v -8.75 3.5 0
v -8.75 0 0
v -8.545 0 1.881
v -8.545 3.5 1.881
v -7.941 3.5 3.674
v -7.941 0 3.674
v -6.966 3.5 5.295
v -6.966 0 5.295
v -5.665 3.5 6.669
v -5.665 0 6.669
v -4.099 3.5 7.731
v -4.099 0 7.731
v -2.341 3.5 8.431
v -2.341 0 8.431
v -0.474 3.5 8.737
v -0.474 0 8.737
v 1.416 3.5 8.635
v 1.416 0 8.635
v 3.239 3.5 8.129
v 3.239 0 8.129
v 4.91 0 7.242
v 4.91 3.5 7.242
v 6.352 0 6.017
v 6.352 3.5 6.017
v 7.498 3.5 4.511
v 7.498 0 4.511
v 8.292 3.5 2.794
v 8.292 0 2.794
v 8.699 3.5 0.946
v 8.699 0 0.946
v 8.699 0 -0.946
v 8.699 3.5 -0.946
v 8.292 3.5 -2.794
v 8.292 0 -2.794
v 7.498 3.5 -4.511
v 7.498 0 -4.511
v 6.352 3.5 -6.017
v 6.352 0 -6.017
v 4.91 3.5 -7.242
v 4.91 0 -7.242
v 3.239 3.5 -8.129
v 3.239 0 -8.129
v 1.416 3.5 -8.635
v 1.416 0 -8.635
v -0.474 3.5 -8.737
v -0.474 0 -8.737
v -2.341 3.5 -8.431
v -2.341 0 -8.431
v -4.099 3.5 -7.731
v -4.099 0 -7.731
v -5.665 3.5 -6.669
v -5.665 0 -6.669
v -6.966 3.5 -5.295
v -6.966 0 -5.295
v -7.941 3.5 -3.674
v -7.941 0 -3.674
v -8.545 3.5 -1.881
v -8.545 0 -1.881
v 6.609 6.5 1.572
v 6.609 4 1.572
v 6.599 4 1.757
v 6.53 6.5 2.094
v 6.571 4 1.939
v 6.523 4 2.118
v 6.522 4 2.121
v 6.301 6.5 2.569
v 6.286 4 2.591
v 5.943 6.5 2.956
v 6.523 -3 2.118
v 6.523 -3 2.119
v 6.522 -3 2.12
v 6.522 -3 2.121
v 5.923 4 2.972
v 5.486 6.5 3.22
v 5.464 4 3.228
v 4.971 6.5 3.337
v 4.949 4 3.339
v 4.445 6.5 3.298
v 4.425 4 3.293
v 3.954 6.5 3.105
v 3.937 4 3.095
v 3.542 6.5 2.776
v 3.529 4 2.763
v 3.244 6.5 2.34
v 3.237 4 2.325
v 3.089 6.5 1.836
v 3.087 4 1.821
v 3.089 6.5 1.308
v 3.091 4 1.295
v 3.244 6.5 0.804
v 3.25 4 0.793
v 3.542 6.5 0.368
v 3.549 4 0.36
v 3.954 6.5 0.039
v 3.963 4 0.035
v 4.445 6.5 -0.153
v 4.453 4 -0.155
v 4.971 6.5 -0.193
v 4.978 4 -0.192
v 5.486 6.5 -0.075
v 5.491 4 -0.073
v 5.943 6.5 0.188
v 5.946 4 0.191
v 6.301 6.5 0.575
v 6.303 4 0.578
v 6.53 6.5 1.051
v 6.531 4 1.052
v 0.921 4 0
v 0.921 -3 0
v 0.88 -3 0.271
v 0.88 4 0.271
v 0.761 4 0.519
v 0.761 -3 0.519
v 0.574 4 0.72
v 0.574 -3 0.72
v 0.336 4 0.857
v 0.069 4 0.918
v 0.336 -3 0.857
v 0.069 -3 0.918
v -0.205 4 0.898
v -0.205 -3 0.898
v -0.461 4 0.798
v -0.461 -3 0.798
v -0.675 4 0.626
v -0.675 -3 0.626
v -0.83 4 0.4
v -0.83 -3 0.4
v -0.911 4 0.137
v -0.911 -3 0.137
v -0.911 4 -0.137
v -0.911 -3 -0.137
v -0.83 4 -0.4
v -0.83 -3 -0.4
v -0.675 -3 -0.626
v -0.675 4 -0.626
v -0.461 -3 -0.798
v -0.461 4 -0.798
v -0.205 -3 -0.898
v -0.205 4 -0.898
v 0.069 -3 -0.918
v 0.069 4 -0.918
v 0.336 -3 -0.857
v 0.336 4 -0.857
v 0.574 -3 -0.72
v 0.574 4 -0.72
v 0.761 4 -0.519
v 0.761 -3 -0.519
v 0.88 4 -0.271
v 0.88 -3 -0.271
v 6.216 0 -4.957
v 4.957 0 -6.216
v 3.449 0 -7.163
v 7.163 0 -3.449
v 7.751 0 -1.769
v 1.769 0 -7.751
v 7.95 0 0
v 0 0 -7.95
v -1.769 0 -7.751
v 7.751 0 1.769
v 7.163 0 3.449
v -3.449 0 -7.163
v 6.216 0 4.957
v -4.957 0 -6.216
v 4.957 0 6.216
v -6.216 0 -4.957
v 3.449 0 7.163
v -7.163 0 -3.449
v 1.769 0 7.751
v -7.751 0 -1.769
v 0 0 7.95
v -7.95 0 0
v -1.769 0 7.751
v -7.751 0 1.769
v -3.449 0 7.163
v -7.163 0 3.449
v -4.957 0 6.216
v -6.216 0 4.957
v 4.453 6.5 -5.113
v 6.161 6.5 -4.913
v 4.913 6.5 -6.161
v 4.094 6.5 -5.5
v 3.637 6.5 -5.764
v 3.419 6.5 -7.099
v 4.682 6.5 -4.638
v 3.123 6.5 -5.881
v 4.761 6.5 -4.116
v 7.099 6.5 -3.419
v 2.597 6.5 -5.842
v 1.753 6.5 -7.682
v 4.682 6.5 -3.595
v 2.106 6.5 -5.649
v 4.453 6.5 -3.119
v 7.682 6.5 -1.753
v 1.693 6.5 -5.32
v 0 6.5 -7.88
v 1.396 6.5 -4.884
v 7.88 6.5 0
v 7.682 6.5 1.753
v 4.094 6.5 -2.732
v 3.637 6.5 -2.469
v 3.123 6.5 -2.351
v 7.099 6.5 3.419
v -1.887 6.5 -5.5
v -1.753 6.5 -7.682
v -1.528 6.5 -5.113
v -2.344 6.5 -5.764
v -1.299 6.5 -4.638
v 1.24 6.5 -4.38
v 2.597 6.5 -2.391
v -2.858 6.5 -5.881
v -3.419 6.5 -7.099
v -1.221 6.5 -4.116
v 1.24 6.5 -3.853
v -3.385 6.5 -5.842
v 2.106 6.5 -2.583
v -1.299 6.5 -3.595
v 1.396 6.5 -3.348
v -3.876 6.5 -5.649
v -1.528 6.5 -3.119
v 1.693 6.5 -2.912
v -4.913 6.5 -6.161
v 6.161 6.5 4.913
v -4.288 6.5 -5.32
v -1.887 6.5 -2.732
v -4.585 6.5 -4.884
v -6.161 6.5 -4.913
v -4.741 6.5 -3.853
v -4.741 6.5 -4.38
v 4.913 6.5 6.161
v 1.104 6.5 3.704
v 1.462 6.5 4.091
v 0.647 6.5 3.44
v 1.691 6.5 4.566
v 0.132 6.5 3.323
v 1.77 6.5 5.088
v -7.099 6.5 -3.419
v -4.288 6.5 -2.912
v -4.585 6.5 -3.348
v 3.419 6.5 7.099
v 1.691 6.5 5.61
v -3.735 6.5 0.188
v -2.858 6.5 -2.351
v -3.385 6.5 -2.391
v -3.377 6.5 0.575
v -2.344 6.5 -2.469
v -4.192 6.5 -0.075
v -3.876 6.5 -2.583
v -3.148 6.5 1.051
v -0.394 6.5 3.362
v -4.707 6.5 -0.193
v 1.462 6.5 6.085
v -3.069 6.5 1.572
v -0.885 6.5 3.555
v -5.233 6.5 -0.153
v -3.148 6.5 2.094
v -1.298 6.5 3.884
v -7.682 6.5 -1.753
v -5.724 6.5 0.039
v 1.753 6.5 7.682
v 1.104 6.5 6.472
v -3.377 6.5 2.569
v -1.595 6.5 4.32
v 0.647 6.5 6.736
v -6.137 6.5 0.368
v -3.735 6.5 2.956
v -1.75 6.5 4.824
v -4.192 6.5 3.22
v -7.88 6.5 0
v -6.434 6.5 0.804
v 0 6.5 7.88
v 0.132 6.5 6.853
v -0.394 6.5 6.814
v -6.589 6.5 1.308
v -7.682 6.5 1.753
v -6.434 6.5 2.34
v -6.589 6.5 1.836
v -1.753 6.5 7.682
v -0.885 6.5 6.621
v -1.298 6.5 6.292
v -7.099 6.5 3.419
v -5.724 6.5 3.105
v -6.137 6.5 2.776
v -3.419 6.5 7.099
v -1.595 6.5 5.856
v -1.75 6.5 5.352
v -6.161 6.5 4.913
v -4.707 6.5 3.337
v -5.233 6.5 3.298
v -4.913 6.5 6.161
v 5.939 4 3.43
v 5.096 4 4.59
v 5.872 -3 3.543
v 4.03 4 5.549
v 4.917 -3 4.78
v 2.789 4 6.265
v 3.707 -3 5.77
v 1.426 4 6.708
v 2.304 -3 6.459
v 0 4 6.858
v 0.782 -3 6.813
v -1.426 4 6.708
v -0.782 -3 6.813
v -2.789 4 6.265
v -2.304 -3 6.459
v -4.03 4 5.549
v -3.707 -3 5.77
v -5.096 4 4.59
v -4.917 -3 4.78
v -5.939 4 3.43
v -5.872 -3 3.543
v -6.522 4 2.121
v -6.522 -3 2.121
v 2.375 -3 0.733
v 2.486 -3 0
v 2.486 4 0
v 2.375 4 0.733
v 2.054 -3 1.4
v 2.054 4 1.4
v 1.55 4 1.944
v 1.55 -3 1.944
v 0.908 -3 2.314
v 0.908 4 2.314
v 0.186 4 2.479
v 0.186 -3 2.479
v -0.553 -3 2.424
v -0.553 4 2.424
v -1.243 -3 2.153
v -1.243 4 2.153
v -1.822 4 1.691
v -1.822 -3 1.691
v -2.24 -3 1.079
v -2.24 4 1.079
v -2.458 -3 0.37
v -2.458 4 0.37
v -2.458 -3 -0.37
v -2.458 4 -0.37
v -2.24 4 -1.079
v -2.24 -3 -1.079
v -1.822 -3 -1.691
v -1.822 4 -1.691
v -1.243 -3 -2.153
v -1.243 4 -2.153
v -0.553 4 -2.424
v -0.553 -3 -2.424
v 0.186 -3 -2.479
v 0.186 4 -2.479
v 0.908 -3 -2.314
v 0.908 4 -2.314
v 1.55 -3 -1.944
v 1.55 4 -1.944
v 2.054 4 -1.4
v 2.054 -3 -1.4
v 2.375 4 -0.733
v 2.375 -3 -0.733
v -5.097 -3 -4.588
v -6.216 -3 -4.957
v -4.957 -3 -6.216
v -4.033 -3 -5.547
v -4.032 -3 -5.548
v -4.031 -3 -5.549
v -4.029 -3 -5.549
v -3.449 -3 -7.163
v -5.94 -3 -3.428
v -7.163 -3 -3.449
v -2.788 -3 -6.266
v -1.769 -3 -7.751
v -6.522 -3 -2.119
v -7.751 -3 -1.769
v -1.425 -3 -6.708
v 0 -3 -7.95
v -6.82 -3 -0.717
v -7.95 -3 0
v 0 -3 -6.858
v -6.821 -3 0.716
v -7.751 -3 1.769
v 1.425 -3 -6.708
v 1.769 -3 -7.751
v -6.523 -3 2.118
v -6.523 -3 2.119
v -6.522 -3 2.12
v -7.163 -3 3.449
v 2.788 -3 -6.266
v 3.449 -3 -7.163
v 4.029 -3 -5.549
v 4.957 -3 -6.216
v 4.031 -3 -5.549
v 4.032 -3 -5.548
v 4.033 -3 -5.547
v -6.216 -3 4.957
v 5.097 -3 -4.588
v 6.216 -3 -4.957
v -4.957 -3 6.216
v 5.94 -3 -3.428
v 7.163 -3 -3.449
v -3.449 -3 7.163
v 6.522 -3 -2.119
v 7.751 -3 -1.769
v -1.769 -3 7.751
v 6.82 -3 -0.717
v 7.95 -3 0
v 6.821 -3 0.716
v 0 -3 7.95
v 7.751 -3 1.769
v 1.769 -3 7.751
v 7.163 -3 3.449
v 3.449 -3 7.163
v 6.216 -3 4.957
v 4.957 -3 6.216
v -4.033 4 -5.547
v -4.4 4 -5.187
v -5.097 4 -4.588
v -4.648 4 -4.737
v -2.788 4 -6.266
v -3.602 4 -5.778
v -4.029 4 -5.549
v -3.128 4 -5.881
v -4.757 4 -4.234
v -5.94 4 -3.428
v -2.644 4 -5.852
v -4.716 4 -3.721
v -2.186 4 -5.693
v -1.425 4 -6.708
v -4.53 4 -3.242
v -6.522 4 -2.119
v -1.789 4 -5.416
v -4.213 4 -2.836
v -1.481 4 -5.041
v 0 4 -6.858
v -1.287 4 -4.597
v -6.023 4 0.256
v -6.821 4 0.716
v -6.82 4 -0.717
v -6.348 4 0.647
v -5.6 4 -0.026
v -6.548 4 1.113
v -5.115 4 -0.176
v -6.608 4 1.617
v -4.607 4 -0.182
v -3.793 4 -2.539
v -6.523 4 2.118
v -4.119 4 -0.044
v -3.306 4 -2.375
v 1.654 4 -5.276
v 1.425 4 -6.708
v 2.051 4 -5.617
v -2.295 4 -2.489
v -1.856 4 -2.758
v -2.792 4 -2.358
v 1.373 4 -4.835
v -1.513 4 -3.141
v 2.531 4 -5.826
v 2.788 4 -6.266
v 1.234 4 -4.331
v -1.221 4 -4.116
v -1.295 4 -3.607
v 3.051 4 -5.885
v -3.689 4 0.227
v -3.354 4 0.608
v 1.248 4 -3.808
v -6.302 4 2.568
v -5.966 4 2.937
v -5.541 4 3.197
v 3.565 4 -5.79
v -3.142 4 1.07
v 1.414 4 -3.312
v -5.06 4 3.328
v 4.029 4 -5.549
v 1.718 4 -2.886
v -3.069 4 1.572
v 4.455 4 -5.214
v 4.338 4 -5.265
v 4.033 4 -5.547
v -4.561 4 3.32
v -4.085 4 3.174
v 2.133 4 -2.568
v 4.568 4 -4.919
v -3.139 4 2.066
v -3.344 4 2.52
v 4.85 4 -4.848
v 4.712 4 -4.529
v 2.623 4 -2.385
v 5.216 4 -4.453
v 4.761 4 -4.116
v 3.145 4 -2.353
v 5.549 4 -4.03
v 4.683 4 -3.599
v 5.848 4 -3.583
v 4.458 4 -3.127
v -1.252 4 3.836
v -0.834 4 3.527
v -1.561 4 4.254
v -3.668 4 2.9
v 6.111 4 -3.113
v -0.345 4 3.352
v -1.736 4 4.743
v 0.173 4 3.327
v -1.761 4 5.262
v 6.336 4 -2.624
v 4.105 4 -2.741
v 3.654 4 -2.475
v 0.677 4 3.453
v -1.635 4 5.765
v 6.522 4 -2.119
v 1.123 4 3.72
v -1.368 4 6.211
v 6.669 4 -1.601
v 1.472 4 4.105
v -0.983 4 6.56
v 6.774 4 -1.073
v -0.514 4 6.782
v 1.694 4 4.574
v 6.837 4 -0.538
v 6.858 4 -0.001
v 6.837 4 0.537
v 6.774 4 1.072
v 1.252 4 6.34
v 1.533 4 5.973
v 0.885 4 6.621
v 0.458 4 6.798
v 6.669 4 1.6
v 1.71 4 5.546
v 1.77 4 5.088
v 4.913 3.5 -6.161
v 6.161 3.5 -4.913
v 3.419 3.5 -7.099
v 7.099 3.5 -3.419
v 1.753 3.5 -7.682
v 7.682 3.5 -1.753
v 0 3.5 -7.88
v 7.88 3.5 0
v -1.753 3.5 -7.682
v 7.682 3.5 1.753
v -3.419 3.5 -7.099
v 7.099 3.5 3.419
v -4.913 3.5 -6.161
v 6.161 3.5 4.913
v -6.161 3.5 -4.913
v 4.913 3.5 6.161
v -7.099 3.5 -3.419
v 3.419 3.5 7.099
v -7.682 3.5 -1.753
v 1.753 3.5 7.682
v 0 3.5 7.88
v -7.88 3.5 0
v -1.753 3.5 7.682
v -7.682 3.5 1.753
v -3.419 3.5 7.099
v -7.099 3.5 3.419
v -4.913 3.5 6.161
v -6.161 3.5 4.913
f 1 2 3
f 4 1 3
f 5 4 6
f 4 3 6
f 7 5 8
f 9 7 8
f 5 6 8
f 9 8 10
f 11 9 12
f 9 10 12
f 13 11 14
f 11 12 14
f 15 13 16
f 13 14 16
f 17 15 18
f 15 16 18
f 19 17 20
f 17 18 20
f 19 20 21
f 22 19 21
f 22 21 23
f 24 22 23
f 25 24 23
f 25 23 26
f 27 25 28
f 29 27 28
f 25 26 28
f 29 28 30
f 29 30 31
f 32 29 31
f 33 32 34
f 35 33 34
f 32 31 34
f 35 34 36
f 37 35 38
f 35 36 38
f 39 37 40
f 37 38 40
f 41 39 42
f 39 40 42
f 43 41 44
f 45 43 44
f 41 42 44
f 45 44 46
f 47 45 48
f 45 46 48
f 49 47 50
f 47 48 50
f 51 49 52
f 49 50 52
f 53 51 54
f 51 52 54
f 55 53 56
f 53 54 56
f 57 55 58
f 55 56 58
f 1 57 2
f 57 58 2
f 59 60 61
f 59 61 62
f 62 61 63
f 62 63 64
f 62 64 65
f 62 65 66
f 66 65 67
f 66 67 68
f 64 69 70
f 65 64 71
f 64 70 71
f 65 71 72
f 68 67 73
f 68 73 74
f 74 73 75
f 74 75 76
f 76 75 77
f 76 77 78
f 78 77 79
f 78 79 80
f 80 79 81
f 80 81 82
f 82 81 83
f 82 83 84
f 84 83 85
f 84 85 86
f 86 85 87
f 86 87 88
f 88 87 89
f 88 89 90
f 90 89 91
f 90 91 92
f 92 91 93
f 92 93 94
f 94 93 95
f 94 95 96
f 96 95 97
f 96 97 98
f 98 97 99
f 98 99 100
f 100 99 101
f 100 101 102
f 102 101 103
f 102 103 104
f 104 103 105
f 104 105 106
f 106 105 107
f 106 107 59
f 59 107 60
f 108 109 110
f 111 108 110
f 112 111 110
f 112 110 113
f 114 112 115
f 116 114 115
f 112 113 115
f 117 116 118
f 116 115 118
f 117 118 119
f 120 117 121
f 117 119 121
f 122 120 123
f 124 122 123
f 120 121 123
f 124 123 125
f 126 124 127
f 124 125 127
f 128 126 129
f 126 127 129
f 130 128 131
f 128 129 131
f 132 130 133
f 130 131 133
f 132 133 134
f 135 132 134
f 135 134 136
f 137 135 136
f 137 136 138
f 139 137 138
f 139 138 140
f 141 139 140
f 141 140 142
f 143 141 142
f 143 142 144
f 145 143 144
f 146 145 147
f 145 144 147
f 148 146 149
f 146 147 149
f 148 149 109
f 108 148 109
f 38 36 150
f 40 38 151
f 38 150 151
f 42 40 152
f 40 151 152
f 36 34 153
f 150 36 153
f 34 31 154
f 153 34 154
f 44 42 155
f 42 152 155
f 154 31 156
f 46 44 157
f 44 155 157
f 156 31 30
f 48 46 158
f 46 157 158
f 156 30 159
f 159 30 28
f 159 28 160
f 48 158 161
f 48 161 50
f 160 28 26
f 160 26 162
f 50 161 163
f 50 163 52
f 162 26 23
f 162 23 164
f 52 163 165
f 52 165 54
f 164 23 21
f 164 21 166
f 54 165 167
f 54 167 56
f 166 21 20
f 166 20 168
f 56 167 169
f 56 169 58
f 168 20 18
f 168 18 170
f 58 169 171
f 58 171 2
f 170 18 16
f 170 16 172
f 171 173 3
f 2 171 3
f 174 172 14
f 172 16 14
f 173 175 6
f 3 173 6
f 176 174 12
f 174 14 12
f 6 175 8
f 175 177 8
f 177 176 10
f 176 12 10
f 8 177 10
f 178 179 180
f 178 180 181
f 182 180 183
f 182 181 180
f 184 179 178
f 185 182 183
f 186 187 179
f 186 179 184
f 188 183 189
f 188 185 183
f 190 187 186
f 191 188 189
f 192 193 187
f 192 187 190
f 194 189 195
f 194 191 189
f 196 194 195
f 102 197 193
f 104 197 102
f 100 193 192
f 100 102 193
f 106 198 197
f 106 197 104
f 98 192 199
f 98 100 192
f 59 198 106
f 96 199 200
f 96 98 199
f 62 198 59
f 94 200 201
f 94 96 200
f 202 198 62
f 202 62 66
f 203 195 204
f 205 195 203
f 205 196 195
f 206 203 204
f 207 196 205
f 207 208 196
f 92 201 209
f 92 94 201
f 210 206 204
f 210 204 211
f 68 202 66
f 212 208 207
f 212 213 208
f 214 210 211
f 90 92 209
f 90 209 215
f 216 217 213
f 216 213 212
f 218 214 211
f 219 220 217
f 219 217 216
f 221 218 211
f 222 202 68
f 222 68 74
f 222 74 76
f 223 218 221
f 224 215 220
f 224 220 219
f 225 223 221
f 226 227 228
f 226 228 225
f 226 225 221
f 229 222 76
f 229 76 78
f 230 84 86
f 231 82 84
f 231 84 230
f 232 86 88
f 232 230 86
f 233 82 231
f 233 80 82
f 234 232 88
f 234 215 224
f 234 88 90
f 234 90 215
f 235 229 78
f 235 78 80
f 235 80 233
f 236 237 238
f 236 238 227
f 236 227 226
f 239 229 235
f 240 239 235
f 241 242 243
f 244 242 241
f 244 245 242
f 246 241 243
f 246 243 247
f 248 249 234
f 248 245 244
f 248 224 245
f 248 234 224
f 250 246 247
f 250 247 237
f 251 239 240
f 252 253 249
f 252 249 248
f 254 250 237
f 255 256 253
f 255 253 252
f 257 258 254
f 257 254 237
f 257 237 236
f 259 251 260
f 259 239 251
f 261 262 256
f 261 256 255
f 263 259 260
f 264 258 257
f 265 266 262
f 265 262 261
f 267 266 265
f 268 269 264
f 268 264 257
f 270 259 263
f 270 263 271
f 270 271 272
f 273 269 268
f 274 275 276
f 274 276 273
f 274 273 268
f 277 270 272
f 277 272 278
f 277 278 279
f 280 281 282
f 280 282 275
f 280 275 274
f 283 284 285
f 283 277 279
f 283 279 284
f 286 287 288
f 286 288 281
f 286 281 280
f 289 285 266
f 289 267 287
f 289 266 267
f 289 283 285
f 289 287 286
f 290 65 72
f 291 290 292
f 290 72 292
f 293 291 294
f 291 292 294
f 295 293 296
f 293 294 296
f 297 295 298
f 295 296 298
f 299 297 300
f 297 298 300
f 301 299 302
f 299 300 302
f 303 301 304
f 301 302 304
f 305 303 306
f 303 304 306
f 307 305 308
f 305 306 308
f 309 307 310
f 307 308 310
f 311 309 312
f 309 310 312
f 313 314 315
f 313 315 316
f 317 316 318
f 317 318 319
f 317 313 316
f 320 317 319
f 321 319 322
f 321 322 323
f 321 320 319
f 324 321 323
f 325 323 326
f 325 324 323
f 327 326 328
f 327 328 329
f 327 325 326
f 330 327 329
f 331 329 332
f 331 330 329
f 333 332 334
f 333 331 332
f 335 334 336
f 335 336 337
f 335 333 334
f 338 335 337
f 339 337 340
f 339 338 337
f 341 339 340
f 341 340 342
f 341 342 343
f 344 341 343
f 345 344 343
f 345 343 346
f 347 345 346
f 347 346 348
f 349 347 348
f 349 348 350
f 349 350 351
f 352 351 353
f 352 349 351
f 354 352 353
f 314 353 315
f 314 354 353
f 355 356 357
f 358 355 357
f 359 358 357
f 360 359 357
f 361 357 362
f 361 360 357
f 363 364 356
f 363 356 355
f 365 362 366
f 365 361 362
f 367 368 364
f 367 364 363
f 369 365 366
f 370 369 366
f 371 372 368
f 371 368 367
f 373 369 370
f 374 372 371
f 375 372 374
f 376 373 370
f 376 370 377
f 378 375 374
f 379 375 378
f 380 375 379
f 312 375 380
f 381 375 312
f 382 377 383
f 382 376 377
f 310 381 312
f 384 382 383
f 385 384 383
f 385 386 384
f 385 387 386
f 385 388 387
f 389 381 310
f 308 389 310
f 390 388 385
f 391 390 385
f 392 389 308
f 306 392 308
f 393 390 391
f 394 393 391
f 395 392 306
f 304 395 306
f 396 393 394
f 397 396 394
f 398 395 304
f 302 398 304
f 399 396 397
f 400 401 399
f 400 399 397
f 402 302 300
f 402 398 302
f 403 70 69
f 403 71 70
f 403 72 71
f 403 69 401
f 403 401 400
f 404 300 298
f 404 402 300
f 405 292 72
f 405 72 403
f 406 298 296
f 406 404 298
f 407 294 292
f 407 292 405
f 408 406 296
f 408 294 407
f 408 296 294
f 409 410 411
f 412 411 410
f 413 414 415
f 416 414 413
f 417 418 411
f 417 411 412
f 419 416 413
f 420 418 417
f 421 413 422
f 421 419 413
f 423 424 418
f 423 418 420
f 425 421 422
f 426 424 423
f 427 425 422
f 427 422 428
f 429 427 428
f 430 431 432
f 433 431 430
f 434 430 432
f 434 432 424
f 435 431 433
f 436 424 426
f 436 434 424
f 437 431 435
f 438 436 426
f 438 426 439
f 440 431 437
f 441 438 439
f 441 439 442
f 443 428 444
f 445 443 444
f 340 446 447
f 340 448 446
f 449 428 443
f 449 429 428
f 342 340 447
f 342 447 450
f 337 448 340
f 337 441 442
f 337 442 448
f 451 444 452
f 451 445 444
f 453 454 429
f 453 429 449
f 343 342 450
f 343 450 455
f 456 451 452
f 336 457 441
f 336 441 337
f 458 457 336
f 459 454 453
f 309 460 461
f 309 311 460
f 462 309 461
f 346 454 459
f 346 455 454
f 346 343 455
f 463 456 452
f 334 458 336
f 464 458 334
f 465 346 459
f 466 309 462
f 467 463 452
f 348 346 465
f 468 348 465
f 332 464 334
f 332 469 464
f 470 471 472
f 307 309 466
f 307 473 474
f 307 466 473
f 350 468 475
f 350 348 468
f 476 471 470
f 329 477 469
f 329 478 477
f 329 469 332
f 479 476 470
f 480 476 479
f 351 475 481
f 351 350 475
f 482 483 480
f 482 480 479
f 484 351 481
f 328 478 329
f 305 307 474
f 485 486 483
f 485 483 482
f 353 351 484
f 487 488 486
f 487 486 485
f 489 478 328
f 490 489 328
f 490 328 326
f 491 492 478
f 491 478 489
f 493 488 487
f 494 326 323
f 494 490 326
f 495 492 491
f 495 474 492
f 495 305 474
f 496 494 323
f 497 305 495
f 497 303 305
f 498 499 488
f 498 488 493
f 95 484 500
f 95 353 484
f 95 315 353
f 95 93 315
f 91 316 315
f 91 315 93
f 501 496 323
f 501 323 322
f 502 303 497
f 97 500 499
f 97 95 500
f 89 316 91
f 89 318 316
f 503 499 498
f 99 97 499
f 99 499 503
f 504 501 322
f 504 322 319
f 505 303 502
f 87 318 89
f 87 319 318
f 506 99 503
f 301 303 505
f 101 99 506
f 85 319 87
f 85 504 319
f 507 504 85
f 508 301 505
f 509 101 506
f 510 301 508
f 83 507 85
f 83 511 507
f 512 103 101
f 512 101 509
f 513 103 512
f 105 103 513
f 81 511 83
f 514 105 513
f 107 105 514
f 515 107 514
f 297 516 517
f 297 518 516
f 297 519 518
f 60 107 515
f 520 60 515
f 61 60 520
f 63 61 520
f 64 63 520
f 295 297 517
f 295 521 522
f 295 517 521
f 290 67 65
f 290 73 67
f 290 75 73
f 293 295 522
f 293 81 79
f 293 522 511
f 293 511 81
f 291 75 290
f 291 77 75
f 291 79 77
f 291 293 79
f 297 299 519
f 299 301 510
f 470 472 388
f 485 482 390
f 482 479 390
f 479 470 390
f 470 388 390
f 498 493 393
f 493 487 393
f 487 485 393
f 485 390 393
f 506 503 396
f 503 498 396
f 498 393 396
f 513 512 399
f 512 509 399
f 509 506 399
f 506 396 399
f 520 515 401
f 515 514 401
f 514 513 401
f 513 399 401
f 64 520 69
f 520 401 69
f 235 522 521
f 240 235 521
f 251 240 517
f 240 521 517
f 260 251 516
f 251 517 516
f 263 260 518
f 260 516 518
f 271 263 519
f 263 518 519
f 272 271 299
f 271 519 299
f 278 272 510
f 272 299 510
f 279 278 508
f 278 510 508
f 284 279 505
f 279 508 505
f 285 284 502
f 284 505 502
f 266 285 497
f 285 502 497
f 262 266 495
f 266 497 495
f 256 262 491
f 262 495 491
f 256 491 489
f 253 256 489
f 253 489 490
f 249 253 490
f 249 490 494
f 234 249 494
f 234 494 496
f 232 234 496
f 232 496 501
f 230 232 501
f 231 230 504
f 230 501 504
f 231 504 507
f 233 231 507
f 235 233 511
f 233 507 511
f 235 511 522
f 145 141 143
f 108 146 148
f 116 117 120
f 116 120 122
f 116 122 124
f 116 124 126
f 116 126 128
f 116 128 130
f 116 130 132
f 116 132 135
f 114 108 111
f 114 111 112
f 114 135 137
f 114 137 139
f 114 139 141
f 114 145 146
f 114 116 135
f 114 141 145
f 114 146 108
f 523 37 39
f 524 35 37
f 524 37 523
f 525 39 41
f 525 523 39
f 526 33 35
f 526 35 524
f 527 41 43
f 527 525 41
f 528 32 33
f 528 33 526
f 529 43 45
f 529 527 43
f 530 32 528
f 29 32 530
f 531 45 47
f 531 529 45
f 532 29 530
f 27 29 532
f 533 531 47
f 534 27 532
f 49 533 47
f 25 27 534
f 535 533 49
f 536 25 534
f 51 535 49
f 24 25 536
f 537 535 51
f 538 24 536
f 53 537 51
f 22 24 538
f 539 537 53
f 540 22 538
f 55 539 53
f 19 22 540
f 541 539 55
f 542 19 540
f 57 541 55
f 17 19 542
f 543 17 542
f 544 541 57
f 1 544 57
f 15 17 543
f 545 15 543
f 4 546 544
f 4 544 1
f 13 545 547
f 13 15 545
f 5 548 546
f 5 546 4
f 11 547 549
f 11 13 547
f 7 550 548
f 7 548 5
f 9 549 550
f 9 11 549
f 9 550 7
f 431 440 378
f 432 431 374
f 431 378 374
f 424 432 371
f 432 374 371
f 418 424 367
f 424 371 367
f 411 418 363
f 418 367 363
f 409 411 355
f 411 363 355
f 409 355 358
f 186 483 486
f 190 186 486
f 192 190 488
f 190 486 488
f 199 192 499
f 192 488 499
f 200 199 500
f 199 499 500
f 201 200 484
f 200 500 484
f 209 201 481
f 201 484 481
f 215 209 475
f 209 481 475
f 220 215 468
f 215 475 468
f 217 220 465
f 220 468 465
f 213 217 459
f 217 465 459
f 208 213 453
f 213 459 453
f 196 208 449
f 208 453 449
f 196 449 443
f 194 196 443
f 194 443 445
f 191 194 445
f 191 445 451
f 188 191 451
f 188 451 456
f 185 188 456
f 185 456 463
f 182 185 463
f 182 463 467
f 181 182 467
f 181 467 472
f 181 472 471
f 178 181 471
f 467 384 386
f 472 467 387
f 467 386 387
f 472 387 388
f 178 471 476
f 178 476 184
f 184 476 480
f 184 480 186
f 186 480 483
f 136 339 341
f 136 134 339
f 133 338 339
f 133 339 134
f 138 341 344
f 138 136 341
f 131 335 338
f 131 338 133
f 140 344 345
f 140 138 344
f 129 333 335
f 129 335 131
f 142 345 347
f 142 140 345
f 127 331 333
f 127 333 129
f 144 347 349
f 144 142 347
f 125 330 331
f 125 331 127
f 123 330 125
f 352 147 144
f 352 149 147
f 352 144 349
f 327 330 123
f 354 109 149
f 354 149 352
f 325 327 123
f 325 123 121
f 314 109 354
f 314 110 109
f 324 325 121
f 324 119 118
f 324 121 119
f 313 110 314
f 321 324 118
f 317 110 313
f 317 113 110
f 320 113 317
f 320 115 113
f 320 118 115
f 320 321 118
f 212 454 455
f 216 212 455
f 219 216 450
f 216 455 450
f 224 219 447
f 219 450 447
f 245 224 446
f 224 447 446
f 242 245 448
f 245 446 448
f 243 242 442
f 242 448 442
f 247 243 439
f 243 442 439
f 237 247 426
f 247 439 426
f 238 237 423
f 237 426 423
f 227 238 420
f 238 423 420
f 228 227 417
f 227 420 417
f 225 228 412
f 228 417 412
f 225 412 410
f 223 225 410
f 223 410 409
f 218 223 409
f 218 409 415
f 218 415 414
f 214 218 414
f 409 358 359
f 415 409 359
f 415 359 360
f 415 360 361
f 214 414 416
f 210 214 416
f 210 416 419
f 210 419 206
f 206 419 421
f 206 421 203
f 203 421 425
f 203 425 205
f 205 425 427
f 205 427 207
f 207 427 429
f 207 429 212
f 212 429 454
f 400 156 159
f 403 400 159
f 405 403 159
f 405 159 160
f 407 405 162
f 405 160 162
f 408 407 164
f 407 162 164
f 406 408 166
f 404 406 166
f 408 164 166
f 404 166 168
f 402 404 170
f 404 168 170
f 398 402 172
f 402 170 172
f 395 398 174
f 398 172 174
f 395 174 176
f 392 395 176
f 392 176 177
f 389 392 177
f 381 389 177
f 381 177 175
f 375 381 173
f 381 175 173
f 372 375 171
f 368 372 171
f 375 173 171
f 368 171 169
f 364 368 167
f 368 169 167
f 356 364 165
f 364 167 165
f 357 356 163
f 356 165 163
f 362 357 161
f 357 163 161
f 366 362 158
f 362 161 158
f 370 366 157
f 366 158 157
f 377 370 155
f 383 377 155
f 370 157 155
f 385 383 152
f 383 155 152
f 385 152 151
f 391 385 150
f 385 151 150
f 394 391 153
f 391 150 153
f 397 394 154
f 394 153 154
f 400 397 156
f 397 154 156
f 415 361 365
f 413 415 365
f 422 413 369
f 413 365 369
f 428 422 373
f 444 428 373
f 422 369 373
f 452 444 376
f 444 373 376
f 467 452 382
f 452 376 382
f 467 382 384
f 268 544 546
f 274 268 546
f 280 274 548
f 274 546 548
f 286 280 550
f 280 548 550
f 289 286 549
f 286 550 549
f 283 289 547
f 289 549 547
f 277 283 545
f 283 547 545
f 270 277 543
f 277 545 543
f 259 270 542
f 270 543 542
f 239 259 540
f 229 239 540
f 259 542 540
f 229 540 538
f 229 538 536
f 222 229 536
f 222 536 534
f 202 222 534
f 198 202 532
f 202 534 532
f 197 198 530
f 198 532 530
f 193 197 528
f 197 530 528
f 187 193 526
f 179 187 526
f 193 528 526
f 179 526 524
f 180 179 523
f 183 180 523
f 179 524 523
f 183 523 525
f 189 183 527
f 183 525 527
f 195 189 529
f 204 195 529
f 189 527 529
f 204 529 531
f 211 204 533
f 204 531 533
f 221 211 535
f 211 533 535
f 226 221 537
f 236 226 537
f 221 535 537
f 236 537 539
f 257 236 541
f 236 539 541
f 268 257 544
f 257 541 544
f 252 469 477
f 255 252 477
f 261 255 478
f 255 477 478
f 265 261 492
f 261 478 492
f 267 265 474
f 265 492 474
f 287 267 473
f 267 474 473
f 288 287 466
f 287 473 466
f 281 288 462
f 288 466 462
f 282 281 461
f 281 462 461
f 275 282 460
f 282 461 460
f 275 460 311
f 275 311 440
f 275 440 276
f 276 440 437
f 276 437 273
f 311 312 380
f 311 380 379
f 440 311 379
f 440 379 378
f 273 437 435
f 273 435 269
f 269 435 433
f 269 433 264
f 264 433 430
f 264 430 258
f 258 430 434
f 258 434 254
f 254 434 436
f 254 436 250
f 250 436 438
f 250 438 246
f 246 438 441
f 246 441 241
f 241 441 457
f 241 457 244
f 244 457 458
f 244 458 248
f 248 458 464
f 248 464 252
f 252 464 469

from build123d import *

# Parameters (mm, degrees)
F0_R      = 7.95
F1_DEPTH  = 3
F2_R      = 8.75
F3_DEPTH  = 3.5
F5_R      = 7.879792
F6_DEPTH  = 3
F7_R      = 1.77
F8_DEPTH  = 25
F9_R      = 6.858058
F9_R_2    = 2.485837
F9_R_3    = 0.921001
F10_DEPTH = 7


with BuildPart() as f1:
    # F0 (on Front) → F1 (new body)
    with BuildSketch(Plane.XZ):
        Circle(F0_R)
    extrude(amount=F1_DEPTH)

    # F2 (on face) → F3 (join)
    with BuildSketch(Plane(origin=(0, 0, 0), x_dir=(-1, 0, 0), z_dir=(0, 1, 0))):
        Circle(F2_R)
    extrude(amount=F3_DEPTH)

    # F5 (on face) → F6 (join)
    with BuildSketch(Plane(origin=(0, 3.5, 0), x_dir=(-1, 0, 0), z_dir=(0, 1, 0))):
        Circle(F5_R)
    extrude(amount=F6_DEPTH)

    # F7 (on face) → F8 (cut)
    with BuildSketch(Plane.XZ.offset(3)):
        with Locations((0, 5.088058)):
            Circle(F7_R)
        with Locations((-4.839031, 1.572297)):
            Circle(F7_R)
        with Locations((-2.990686, -4.116326)):
            Circle(F7_R)
        with Locations((2.990686, -4.116326)):
            Circle(F7_R)
        with Locations((4.839031, 1.572297)):
            Circle(F7_R)
    extrude(amount=-F8_DEPTH, mode=Mode.SUBTRACT)

    # F9 (on face) → F10 (cut)
    with BuildSketch(Plane.XZ.offset(3)):
        Circle(F9_R)
        Circle(F9_R_2, mode=Mode.SUBTRACT)
        Circle(F9_R_3)
    extrude(amount=-F10_DEPTH, mode=Mode.SUBTRACT)


solid = f1.part
